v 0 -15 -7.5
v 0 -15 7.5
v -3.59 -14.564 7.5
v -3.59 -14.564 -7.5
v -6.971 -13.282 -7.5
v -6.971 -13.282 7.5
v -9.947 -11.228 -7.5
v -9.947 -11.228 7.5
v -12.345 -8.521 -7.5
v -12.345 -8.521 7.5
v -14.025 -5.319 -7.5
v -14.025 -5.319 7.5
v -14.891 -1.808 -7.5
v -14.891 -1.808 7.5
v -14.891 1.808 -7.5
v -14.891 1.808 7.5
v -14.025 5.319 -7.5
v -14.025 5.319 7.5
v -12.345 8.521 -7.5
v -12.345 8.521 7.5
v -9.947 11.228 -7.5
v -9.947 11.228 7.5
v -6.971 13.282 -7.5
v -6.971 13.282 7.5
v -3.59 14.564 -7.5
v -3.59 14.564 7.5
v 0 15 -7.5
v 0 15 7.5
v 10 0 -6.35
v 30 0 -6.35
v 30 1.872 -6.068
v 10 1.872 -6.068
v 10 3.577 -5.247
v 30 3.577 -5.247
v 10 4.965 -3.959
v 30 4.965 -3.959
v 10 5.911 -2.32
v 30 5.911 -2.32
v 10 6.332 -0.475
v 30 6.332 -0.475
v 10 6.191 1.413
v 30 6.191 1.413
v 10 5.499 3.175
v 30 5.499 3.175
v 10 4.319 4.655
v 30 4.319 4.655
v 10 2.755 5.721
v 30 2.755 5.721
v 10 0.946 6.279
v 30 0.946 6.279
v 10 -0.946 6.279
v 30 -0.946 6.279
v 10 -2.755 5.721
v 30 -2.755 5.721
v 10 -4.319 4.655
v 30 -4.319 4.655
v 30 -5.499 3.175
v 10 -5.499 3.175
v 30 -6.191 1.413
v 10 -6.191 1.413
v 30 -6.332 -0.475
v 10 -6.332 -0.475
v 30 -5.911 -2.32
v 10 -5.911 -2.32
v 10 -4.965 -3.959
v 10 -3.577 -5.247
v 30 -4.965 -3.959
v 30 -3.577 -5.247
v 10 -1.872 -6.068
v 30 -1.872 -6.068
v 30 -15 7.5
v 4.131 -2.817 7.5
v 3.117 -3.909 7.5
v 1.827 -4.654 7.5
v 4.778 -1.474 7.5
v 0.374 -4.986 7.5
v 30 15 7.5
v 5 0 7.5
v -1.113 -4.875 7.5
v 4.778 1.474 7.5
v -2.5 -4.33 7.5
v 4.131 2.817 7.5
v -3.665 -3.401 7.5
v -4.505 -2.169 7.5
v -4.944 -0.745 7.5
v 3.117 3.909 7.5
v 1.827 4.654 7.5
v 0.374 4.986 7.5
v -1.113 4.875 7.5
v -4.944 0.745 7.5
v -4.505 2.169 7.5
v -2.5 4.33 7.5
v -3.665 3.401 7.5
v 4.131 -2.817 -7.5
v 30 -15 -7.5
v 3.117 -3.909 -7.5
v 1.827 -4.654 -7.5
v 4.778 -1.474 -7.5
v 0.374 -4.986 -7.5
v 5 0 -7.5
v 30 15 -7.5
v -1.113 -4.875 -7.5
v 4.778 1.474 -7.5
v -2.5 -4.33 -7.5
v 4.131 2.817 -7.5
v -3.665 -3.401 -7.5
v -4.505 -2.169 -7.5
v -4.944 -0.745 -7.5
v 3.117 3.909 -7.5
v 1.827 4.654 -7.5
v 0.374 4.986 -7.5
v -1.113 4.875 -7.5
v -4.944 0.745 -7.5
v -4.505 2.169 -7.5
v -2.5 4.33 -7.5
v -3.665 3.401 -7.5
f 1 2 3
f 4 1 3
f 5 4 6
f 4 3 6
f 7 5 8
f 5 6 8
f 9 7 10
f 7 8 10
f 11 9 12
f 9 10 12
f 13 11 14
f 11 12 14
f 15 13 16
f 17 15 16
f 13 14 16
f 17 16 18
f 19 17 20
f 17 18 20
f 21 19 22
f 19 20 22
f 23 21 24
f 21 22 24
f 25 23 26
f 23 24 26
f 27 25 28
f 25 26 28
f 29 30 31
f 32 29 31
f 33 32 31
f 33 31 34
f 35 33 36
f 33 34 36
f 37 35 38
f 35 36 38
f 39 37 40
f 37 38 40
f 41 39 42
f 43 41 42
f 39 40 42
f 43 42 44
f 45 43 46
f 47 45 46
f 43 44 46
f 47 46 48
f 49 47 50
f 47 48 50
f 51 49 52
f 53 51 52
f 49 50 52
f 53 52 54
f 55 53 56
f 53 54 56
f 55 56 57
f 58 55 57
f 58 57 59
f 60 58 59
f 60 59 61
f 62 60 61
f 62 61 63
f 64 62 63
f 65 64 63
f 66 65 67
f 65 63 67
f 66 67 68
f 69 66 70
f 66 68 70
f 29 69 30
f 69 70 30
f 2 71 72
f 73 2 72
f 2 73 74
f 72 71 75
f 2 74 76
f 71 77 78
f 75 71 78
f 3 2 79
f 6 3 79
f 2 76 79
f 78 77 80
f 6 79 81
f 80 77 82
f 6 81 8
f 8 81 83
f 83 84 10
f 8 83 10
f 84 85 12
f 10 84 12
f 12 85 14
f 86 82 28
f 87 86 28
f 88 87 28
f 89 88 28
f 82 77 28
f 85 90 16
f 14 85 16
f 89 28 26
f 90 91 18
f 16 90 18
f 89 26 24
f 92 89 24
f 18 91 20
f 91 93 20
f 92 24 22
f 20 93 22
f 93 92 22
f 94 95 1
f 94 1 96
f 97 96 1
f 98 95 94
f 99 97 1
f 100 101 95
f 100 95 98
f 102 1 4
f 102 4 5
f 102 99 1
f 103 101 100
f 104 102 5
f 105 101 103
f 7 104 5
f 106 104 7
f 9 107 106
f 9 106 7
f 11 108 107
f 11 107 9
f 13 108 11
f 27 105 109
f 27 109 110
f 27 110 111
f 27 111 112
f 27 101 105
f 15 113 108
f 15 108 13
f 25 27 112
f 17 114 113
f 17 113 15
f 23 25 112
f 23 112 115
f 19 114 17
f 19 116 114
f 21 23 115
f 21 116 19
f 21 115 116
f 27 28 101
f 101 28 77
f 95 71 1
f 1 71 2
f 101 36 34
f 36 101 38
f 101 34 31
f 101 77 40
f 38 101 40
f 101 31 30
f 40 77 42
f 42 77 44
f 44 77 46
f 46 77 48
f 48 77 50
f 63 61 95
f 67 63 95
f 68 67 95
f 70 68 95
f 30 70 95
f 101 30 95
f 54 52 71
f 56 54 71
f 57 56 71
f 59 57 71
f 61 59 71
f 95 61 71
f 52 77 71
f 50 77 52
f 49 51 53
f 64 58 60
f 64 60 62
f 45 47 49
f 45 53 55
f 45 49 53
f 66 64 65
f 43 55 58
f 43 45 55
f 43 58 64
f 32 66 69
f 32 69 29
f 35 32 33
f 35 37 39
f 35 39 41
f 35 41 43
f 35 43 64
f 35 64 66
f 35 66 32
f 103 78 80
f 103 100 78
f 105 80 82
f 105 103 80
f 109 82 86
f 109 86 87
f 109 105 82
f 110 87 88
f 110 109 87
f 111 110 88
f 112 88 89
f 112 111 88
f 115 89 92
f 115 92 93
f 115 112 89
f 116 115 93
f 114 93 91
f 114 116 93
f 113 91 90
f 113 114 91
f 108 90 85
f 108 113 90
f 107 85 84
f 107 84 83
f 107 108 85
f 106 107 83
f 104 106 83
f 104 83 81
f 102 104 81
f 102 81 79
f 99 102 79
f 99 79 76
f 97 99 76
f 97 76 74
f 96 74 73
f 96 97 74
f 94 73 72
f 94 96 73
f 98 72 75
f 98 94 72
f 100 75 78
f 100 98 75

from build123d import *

# Parameters (mm, degrees)
SKETCH1_R           = 5
BOSS_EXTRUDE1_DEPTH = 7.5
SKETCH2_R           = 6.35
CUT_EXTRUDE1_DEPTH  = 20


with BuildPart() as part:
    # Sketch1 → Boss-Extrude1 (new body, symmetric)
    with BuildSketch(Plane.XY):
        with BuildLine():
            Line((0, 15), (30, 15))
            Line((30, 15), (30, -15))
            Line((30, -15), (0, -15))
            ThreePointArc((0, -15), (-15, 0), (0, 15))
        make_face()
        Circle(SKETCH1_R, mode=Mode.SUBTRACT)
    extrude(amount=BOSS_EXTRUDE1_DEPTH, both=True)

    # Sketch2 → Cut-Extrude1 (cut)
    with BuildSketch(Plane(origin=(30, 0, 0), x_dir=(0, 0, -1), z_dir=(1, 0, 0))):
        Circle(SKETCH2_R)
    extrude(amount=-CUT_EXTRUDE1_DEPTH, mode=Mode.SUBTRACT)


solid = part.part
